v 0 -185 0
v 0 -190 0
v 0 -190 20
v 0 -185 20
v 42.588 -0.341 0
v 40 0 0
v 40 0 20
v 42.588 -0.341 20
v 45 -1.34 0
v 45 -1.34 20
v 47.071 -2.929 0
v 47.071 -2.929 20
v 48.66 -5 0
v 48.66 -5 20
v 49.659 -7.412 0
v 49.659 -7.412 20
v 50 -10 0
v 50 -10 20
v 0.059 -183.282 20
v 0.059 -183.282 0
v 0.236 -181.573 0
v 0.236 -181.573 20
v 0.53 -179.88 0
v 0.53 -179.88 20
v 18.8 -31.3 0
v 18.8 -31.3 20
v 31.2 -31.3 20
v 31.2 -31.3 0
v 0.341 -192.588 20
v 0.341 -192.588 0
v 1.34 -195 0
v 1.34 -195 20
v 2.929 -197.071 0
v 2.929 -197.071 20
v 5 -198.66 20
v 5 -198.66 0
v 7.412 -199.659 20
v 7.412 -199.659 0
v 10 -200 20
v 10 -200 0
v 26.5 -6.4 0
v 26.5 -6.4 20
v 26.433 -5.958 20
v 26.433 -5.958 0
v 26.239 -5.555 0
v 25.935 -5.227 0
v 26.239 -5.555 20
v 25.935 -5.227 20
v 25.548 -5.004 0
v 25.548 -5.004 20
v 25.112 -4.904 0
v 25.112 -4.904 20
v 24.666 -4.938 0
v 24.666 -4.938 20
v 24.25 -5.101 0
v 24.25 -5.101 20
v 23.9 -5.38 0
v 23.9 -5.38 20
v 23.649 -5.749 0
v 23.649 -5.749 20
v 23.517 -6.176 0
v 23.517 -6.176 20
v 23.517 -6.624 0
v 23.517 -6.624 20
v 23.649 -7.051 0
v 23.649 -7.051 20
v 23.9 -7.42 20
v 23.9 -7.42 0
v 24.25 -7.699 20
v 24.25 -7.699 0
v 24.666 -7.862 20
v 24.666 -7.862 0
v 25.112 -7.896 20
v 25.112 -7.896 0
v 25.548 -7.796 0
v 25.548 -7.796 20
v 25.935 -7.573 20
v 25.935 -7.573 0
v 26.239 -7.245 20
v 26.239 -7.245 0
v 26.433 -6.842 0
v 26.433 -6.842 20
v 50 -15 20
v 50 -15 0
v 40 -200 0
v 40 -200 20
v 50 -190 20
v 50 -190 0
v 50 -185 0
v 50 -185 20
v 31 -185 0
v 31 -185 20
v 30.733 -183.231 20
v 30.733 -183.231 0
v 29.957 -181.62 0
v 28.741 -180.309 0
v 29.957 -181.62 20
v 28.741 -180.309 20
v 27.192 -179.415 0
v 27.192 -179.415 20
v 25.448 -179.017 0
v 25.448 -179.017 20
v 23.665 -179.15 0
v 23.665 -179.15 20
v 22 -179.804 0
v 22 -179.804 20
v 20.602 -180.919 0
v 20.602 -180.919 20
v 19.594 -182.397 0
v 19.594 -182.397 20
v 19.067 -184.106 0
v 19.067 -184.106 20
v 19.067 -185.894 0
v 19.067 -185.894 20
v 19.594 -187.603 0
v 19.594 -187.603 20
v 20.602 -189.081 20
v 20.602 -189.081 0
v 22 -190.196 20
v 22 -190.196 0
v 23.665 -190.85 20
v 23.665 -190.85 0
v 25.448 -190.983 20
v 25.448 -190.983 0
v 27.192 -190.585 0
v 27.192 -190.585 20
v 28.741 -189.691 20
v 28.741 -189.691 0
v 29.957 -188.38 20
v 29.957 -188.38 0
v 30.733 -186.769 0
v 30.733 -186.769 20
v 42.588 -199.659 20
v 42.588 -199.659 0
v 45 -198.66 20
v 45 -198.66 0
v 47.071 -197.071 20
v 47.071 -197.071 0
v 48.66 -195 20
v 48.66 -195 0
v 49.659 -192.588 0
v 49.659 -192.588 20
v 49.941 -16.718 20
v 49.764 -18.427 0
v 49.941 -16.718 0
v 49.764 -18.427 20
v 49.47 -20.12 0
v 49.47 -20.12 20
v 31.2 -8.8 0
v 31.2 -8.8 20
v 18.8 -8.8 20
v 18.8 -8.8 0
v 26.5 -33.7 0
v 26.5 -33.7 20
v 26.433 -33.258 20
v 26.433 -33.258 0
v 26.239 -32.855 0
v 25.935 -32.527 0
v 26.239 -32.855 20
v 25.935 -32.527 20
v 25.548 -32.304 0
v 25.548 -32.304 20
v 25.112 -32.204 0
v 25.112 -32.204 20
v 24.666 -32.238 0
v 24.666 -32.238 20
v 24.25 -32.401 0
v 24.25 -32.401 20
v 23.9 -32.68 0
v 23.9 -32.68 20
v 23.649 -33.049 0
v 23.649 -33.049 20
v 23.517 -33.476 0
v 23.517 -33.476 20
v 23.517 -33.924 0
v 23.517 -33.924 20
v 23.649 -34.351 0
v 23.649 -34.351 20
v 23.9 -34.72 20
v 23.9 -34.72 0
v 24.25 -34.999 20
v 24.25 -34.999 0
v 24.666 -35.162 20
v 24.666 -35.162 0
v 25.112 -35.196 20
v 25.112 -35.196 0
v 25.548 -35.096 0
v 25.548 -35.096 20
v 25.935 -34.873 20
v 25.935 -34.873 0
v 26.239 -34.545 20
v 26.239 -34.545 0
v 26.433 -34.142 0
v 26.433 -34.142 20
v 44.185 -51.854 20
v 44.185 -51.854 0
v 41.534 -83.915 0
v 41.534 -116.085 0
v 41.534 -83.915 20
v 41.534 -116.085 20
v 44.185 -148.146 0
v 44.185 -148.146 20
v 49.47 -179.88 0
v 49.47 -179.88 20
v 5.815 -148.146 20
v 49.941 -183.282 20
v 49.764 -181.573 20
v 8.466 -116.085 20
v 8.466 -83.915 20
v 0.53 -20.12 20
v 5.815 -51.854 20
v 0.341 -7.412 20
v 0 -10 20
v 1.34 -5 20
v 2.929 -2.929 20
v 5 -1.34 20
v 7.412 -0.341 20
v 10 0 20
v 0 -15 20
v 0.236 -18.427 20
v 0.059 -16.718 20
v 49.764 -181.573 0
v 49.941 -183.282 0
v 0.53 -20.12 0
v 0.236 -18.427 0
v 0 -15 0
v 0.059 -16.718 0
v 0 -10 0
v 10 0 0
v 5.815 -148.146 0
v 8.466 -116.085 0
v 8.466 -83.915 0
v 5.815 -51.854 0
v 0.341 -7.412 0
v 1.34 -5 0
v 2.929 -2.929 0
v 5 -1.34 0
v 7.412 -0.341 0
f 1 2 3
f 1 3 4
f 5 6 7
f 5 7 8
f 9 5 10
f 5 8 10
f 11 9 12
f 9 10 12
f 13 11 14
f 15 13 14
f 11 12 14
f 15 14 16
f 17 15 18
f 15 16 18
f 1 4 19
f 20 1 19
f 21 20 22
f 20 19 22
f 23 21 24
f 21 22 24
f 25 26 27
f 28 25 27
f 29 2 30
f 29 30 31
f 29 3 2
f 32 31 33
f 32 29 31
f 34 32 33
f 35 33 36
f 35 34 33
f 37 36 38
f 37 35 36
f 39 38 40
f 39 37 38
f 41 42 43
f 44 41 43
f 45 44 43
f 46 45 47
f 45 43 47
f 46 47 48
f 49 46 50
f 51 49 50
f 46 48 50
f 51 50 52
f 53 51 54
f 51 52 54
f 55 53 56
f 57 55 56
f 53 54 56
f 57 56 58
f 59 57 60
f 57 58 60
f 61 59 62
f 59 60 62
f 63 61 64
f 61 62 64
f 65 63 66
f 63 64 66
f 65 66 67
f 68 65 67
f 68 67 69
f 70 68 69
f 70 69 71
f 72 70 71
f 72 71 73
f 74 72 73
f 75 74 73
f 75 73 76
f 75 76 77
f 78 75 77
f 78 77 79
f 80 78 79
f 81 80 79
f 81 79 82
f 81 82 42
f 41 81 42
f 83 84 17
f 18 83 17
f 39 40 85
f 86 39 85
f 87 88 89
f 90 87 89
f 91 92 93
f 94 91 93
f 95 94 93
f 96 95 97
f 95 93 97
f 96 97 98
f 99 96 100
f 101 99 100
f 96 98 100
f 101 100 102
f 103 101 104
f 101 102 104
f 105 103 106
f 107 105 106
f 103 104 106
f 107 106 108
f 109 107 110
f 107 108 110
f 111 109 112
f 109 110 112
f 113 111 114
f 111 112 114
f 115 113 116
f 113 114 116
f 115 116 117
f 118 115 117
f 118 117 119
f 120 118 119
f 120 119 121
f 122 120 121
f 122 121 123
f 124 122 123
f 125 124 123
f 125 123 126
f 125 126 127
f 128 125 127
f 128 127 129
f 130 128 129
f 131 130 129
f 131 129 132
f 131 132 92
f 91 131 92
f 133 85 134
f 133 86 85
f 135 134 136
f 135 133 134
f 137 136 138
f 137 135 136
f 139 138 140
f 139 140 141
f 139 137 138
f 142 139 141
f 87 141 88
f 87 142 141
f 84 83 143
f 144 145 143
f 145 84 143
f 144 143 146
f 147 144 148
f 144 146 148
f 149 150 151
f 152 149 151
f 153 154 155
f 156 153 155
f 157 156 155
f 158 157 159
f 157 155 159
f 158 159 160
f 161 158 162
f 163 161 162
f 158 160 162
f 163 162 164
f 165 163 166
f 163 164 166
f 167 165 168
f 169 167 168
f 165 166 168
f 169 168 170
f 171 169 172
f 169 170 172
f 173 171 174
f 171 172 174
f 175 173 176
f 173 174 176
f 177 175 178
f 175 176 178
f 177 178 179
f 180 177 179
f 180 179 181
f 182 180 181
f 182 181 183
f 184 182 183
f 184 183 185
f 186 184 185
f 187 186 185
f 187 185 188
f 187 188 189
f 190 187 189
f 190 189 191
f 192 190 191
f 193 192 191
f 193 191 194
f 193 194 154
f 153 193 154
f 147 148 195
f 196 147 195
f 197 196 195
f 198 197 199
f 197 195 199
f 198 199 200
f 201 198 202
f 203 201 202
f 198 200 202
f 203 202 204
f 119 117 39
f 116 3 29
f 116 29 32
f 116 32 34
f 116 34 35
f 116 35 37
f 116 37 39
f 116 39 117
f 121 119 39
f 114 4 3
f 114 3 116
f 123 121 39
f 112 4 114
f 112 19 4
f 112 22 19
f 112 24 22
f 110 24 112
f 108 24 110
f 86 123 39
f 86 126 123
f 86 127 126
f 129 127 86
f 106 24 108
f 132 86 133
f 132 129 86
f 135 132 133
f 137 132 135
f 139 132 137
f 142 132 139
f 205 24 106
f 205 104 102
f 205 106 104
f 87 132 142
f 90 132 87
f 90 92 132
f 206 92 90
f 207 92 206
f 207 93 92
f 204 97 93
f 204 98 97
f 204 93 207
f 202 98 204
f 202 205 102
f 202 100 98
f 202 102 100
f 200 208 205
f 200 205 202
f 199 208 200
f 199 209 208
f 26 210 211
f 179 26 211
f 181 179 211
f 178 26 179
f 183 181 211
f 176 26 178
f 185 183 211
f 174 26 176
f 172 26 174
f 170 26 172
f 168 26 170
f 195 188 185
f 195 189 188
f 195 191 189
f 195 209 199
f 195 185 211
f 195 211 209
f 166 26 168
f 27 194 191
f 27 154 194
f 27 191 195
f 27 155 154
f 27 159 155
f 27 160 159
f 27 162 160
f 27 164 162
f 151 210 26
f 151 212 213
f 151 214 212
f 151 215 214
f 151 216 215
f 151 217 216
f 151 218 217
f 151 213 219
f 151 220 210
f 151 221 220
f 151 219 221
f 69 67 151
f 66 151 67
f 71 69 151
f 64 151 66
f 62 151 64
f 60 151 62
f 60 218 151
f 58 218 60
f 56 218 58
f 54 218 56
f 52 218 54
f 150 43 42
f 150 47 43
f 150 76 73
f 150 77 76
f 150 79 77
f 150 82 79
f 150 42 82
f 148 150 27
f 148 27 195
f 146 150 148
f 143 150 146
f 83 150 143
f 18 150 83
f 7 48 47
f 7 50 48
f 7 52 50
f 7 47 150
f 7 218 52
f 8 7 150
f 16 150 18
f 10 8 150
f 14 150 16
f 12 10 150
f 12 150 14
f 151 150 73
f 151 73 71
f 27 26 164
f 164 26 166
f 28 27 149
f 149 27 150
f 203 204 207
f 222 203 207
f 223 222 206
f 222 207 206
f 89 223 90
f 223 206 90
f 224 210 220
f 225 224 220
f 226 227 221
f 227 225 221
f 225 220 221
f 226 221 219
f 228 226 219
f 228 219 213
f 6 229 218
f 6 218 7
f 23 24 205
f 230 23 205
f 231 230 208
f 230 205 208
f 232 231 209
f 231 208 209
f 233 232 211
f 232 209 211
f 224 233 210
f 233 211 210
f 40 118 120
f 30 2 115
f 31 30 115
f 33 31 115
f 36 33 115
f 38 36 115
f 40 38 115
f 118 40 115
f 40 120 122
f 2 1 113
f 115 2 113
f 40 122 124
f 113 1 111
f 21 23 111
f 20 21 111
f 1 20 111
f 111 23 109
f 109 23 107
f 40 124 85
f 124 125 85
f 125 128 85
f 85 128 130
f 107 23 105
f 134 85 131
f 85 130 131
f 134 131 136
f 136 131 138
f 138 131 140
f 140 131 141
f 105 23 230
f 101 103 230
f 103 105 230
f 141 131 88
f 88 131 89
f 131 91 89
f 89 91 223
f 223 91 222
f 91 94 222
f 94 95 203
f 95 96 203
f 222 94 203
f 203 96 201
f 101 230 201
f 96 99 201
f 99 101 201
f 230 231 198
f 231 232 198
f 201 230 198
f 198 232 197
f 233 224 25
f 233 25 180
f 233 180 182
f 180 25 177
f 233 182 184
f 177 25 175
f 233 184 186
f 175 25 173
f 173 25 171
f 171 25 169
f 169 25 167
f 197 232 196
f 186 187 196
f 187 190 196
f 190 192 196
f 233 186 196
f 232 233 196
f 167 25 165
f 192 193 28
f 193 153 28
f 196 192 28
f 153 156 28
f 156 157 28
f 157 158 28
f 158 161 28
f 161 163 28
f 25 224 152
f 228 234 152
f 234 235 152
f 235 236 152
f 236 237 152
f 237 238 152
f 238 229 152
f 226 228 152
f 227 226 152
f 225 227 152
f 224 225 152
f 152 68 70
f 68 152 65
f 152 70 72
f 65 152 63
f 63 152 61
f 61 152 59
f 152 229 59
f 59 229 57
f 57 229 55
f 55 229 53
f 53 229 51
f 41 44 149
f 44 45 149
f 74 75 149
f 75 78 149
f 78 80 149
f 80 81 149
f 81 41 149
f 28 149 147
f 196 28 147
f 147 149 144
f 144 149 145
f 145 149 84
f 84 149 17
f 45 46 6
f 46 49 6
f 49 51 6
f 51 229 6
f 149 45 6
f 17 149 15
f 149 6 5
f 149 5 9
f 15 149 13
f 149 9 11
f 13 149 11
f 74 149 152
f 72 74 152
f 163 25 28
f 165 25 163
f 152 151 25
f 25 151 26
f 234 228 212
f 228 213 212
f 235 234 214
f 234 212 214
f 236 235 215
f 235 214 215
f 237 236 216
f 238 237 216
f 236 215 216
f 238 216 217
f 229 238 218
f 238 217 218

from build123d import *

# Parameters (mm, degrees)
SKETCH1_W               = 50
SKETCH1_H               = 200
BOSS_EXTRUDE1_DEPTH     = 20
SKETCH2_R               = 6
CUT_EXTRUDE1_DEPTH      = 84
FILLET1_R               = 10
SKETCH4_R               = 6
SKETCH4_R_2             = 1.5
CUT_EXTRUDE2_DEPTH      = 33
CUT_EXTRUDE3_DEPTH      = 1
CUT_EXTRUDE3_DEPTH_BACK = 53


with BuildPart() as part:
    # Sketch1 → Boss-Extrude1 (new body)
    with BuildSketch(Plane.XY):
        with Locations((25, -100)):
            Rectangle(SKETCH1_W, SKETCH1_H)
    extrude(amount=BOSS_EXTRUDE1_DEPTH)

    # Sketch2 → Cut-Extrude1 (cut)
    with BuildSketch(Plane.XY.offset(20)):
        with Locations((25, -185)):
            Circle(SKETCH2_R)
        with Locations((25, -15)):
            Circle(SKETCH2_R)
    extrude(amount=-CUT_EXTRUDE1_DEPTH, mode=Mode.SUBTRACT)

    # Fillet1
    fillet1_edges = [part.edges().sort_by_distance(p)[0] for p in [
        (0, 0, 10),
        (50, 0, 10),
        (50, -200, 10),
        (0, -200, 10),
    ]]
    fillet(fillet1_edges, radius=FILLET1_R)

    # Sketch4 → Cut-Extrude2 (cut)
    with BuildSketch(Plane.XY.offset(20)):
        Polygon((31.2, -8.8), (25, -8.8), (18.8, -8.8), (18.8, -31.3), (25, -31.3), (31.2, -31.3), align=None)
        with Locations((25, -15)):
            Circle(SKETCH4_R, mode=Mode.SUBTRACT)
        with Locations((25, -33.7)):
            Circle(SKETCH4_R_2)
        with Locations((25, -6.4)):
            Circle(SKETCH4_R_2)
    extrude(amount=-CUT_EXTRUDE2_DEPTH, mode=Mode.SUBTRACT)

    # Sketch5 → Cut-Extrude3 (cut, two sides)
    with BuildSketch(Plane.XY.offset(20)) as cut_extrude3_sk:
        with BuildLine():
            ThreePointArc((49.469995195, -179.879518072), (49.867145794, -182.426080796), (50, -185))
            Line((50, -185), (50, -15))
            ThreePointArc((50, -15), (49.867145794, -17.573919204), (49.469995195, -20.120481928))
            ThreePointArc((49.469995195, -20.120481928), (41.201920232, -100), (49.469995195, -179.879518072))
        make_face()
        with BuildLine():
            ThreePointArc((0.530004805, -20.120481928), (0.132854206, -17.573919204), (0, -15))
            Line((0, -15), (0, -185))
            ThreePointArc((0, -185), (0.132854206, -182.426080796), (0.530004805, -179.879518072))
            ThreePointArc((0.530004805, -179.879518072), (8.798079768, -100), (0.530004805, -20.120481928))
        make_face()
    extrude(amount=CUT_EXTRUDE3_DEPTH, mode=Mode.SUBTRACT)
    extrude(cut_extrude3_sk.sketch, amount=-CUT_EXTRUDE3_DEPTH_BACK, mode=Mode.SUBTRACT)


solid = part.part
